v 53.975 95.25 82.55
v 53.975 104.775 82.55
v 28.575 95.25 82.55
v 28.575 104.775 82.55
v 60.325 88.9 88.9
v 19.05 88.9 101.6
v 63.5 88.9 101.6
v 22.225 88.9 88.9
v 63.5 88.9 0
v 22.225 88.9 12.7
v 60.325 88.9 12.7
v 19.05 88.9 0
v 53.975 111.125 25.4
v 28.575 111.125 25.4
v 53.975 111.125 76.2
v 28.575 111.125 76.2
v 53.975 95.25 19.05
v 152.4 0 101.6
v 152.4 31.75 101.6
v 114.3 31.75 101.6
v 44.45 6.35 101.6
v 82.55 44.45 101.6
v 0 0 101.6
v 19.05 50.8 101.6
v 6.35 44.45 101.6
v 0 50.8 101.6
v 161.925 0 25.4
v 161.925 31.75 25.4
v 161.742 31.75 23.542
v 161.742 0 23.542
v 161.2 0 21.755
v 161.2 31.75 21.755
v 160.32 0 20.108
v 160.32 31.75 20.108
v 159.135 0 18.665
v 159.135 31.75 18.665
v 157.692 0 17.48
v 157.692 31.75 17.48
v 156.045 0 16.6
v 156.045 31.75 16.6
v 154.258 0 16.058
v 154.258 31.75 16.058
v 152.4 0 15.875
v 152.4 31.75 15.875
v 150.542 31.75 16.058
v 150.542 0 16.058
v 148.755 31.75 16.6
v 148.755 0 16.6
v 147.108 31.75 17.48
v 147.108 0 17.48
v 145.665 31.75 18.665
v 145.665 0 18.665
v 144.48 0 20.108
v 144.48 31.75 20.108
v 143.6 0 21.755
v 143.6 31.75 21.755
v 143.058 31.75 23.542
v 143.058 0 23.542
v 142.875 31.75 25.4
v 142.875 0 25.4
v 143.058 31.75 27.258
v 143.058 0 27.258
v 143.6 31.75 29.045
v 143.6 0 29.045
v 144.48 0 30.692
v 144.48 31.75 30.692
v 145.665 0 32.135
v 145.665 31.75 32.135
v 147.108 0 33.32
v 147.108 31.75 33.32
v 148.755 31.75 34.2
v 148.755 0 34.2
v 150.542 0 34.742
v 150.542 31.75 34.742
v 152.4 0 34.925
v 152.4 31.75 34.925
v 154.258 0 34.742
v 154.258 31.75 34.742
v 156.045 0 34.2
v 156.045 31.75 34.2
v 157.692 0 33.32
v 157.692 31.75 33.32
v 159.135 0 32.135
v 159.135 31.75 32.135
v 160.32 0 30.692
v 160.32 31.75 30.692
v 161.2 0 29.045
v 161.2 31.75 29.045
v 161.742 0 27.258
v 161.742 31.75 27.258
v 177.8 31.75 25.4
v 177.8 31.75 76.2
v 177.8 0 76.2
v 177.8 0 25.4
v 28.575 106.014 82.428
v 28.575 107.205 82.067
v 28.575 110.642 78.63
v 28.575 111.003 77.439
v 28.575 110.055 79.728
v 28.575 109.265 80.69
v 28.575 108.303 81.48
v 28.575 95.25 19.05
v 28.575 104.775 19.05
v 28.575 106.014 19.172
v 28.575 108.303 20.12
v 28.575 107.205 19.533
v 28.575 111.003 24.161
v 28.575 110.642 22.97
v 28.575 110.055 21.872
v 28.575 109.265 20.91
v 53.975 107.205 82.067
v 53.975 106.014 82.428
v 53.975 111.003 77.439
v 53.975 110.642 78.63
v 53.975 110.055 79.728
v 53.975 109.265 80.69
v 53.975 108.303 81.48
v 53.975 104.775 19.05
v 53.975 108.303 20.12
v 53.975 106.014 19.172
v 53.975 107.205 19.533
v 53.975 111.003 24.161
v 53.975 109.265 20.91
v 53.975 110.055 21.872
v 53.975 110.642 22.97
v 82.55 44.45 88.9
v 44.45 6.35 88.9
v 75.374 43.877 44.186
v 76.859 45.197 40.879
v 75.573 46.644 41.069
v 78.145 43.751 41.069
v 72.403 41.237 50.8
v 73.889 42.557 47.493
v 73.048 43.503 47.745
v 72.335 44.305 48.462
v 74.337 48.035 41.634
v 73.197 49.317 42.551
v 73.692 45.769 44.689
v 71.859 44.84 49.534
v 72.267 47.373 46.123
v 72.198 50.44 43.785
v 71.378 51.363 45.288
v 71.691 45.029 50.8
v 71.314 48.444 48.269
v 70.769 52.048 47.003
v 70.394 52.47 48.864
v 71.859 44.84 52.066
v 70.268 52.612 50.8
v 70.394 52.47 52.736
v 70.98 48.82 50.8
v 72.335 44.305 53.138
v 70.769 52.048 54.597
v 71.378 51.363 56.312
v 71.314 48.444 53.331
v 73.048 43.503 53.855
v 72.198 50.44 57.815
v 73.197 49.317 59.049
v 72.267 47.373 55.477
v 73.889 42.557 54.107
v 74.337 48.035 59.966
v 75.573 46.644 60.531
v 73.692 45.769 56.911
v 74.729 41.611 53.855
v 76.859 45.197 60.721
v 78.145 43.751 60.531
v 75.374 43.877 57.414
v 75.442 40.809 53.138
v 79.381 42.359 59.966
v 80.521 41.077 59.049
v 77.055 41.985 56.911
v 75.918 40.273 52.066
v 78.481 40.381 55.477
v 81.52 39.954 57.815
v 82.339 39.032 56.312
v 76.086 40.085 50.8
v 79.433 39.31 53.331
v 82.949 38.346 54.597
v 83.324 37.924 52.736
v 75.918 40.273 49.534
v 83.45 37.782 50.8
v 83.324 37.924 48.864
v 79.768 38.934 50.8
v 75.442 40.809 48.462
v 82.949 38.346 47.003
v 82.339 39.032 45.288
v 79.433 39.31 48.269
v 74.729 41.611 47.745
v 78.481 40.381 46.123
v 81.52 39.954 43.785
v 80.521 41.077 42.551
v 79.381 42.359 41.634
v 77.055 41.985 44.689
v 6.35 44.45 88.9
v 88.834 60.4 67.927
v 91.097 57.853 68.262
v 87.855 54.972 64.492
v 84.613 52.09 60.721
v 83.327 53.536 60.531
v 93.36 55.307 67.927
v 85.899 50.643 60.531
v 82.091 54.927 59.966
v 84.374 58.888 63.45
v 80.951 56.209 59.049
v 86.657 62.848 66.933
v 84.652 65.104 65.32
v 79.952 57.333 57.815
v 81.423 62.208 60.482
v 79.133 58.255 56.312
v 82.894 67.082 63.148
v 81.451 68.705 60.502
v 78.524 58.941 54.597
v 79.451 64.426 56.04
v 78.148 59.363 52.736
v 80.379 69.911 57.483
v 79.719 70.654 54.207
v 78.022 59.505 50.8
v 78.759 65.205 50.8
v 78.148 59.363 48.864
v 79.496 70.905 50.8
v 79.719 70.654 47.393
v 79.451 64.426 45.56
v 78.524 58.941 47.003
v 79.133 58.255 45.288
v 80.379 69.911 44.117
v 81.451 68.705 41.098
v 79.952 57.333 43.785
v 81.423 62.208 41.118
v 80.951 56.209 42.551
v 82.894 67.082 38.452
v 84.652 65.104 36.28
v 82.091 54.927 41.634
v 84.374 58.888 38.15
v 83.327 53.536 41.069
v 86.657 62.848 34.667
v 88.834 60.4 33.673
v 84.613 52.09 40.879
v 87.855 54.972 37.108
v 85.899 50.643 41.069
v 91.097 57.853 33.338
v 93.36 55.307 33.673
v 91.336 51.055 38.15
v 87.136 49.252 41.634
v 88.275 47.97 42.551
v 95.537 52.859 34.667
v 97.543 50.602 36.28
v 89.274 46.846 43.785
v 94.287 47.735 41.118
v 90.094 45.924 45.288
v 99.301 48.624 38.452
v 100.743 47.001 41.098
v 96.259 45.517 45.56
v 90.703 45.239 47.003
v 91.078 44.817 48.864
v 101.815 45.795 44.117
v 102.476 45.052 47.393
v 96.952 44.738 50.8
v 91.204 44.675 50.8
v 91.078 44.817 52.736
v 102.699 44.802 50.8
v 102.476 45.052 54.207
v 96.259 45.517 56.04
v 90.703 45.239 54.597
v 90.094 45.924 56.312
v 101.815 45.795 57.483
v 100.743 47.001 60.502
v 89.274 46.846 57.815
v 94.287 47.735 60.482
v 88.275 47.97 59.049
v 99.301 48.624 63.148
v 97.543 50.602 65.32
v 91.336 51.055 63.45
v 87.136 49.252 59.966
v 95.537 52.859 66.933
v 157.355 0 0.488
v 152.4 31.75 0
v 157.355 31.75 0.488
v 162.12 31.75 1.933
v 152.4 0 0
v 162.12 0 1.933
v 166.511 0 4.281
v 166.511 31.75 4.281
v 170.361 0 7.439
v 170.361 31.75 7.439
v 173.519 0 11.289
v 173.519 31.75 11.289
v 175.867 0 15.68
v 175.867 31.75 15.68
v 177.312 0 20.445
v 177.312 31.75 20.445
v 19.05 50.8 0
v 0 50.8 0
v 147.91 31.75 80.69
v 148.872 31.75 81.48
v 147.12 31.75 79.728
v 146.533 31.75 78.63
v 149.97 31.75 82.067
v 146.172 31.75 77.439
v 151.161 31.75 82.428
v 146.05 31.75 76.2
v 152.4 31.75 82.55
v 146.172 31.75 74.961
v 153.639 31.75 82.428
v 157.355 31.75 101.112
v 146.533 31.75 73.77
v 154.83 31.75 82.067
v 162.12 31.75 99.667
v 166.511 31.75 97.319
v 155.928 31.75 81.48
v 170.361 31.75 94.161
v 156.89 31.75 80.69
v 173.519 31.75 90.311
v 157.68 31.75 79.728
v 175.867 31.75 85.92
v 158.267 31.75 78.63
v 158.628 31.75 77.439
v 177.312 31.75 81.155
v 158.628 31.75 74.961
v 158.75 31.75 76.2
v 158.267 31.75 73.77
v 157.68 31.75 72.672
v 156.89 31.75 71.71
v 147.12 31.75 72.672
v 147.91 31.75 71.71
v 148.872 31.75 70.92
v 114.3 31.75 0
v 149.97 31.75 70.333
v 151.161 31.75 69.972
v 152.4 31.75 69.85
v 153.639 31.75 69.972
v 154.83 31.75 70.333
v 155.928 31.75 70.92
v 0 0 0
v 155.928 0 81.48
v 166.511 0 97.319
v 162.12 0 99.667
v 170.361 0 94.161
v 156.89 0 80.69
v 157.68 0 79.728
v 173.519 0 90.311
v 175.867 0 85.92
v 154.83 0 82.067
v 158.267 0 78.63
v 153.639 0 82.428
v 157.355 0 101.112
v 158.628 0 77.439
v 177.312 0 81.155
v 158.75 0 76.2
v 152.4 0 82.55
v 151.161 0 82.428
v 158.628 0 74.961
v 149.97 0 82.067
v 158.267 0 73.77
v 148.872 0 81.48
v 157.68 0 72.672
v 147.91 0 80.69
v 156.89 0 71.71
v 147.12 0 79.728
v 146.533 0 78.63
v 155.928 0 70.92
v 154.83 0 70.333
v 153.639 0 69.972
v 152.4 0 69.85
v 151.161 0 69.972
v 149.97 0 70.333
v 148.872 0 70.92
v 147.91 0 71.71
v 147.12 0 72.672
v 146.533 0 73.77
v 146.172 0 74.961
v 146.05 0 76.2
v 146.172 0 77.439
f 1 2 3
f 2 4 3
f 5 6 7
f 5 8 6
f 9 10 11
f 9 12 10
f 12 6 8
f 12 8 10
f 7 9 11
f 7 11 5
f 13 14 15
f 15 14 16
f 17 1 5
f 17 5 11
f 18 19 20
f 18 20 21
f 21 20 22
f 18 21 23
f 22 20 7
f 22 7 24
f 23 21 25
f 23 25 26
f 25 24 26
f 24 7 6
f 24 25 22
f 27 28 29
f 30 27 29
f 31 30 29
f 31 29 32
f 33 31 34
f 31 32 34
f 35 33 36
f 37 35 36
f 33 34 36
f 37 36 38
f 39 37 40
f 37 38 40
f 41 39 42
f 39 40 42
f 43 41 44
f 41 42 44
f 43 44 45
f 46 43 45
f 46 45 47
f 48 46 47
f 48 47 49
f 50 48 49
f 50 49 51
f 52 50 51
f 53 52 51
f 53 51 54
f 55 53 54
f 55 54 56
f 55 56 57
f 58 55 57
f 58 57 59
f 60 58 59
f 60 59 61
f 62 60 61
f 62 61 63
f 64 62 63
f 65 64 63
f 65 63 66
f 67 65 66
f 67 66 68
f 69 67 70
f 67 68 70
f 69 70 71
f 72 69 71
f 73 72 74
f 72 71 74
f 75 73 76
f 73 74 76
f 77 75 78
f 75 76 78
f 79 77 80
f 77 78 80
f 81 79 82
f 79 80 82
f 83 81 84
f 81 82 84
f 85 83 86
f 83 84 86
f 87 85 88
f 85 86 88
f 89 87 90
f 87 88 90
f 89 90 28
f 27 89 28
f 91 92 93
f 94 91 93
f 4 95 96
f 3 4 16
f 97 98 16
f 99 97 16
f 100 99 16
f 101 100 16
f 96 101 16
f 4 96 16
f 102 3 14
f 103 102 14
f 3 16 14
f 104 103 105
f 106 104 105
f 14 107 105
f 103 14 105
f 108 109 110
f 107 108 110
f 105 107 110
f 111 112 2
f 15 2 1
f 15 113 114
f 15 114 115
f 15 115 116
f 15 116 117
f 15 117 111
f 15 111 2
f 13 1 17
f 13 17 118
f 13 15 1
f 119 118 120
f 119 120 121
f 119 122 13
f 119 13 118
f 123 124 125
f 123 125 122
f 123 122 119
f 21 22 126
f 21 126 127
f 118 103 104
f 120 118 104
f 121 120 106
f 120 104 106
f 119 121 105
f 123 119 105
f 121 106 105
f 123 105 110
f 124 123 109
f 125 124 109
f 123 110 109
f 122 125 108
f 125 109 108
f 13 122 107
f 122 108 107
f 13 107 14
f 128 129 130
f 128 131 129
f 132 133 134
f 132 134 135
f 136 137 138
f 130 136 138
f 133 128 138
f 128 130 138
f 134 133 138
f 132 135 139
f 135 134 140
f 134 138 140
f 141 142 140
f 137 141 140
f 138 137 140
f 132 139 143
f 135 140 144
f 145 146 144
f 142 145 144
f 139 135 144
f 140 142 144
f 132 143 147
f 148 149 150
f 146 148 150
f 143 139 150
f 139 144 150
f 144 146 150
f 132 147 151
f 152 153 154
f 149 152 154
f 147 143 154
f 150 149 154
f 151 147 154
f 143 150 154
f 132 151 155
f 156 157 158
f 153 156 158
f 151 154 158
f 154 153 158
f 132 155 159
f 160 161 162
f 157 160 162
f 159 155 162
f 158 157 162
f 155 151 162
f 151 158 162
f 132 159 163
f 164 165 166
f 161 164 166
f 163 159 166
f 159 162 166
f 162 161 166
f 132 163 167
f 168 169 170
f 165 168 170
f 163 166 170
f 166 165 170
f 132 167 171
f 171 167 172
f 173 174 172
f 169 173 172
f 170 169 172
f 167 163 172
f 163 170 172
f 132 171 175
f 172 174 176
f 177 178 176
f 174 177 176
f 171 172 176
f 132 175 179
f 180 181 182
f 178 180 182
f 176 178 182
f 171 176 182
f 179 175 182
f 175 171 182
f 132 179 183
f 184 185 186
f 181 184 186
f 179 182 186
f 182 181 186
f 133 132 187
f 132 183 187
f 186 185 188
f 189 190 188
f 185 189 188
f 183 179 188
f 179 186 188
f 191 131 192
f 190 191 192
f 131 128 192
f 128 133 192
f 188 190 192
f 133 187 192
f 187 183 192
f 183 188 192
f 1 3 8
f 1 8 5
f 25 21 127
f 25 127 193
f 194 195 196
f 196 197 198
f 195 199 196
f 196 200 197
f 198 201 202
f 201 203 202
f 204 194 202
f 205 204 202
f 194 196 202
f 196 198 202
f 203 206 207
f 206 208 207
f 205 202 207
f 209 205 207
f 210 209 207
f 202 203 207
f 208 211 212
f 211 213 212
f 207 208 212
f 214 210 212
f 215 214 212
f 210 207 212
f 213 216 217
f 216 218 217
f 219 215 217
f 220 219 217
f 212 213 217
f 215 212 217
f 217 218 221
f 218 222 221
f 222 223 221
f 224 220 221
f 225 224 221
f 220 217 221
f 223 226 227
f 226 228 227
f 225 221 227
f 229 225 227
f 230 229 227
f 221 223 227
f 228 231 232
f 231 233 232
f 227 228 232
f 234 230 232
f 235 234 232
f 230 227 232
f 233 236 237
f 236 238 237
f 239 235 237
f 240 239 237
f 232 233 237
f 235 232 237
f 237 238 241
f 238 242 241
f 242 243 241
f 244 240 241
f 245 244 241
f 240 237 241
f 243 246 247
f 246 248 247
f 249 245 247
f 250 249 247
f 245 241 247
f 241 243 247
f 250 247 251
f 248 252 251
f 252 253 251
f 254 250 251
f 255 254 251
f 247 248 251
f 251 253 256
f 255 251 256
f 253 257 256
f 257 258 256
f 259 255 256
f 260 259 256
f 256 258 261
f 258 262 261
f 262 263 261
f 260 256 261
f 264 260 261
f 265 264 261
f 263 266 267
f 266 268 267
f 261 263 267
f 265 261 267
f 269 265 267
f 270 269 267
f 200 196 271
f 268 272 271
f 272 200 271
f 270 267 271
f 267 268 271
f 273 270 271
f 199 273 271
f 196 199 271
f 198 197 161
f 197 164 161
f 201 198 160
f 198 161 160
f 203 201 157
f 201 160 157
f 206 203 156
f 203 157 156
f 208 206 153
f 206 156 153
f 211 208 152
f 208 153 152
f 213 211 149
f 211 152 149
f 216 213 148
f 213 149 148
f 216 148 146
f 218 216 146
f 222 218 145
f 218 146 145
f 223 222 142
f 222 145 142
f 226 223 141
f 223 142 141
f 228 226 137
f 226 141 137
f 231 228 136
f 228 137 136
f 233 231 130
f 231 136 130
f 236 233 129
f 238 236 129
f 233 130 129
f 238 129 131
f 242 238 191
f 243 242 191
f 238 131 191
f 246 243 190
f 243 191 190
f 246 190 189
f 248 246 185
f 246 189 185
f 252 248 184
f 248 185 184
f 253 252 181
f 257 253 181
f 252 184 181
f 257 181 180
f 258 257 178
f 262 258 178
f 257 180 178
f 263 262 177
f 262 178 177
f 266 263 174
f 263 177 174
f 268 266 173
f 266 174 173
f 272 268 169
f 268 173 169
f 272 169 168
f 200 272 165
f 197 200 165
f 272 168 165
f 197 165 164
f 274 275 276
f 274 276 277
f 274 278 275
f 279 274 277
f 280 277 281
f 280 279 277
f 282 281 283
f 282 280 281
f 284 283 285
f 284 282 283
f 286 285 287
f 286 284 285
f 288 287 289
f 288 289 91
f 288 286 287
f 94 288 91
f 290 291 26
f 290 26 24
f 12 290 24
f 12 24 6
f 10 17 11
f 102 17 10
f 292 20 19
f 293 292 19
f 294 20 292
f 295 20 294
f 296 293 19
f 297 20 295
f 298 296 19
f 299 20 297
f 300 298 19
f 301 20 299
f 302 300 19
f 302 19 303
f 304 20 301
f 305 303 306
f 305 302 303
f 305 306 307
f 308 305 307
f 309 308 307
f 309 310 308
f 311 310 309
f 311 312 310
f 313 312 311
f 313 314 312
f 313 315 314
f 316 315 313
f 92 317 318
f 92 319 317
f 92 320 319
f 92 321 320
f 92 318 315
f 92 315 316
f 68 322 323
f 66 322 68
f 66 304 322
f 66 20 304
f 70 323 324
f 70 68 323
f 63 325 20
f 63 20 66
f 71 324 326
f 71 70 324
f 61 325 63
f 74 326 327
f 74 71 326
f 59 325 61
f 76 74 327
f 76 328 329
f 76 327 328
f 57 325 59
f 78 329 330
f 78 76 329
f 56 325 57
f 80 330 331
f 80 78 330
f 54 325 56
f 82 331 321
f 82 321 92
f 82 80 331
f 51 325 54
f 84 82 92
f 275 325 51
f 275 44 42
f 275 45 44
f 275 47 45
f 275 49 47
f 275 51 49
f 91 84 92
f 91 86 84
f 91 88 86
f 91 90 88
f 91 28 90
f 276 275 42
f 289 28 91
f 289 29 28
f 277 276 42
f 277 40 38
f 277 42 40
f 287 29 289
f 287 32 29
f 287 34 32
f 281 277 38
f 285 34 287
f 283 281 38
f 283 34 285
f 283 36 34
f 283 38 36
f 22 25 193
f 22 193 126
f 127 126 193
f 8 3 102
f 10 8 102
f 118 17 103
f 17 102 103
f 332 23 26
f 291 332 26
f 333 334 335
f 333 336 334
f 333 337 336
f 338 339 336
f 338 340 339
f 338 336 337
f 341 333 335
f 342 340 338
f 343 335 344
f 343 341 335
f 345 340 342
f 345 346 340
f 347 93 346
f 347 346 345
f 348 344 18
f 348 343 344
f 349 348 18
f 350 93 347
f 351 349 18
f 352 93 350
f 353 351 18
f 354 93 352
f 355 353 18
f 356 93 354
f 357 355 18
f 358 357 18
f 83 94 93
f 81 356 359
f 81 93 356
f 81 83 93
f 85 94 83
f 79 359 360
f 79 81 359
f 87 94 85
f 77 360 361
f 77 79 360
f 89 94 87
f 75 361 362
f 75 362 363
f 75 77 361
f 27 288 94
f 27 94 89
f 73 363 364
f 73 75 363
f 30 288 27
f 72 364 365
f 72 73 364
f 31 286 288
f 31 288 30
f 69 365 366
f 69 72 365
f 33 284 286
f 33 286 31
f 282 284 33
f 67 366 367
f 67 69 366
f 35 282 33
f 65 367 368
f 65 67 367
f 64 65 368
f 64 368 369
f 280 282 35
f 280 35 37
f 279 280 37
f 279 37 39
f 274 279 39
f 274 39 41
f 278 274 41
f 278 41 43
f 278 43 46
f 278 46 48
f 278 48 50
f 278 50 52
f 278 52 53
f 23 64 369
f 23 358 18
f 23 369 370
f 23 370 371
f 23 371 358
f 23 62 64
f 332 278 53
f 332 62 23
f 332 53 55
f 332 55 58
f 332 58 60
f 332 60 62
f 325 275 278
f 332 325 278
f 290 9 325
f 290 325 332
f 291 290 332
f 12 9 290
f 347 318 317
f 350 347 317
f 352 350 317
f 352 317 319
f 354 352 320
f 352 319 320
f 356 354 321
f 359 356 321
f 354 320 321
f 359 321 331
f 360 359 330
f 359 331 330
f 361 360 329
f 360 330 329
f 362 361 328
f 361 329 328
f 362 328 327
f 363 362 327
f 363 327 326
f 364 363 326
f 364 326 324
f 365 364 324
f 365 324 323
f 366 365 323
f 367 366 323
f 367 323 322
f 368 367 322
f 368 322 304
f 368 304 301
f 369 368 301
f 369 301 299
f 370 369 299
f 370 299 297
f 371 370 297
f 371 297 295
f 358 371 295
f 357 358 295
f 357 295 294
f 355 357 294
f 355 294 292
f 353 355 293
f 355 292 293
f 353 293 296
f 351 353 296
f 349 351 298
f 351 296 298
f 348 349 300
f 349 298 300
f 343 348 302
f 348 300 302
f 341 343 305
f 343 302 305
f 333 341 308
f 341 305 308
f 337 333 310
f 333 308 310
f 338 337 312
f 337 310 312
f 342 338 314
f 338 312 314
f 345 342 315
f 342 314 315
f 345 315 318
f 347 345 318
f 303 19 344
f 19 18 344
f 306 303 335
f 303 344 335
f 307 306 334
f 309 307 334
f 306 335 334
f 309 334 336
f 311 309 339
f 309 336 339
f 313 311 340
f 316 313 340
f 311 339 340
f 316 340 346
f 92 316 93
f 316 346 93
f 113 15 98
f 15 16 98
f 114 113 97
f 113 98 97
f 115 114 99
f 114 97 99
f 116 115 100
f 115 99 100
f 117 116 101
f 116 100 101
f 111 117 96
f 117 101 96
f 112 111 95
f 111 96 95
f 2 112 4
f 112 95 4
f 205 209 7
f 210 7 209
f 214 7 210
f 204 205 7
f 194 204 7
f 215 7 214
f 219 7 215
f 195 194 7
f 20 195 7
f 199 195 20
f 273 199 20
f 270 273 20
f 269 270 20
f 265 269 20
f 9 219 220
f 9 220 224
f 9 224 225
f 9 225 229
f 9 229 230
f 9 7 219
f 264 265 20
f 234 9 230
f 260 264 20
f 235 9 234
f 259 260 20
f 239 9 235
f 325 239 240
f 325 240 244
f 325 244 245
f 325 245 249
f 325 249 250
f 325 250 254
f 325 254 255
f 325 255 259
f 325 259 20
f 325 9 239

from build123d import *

# Parameters (mm, degrees)
BOSS_EXTRUDE1_DEPTH                              = 101.6
BOSS_EXTRUDE2_DEPTH                              = 12.7
CHAMFER1_SIZE                                    = 6.35
FILLET1_R                                        = 25.4
CUT_EXTRUDE2_DEPTH                               = 12.7
CSK_FOR_3_4_FLAT_HEAD_MACHINE_SCREW1_D           = 19.84248
CSK_FOR_3_4_FLAT_HEAD_MACHINE_SCREW1_DEPTH       = 19.05
CSK_FOR_3_4_FLAT_HEAD_MACHINE_SCREW1_CSINK_D     = 34.925
CSK_FOR_3_4_FLAT_HEAD_MACHINE_SCREW1_CSINK_ANGLE = 82
CSK_FOR_3_4_FLAT_HEAD_MACHINE_SCREW1_TIP         = 5.961282408
F_3_4_0_75_DIAMETER_HOLE1_D                      = 19.05
F_1_2_0_5_DIAMETER_HOLE1_D                       = 12.7


with BuildPart() as part:
    # Sketch1 → Boss-Extrude1 (new body)
    with BuildSketch(Plane.XY):
        Polygon((0, 0), (0, 50.8), (19.05, 50.8), (19.05, 88.9), (63.5, 88.9), (114.3, 31.75), (177.8, 31.75), (177.8, 0), align=None)
    extrude(amount=BOSS_EXTRUDE1_DEPTH)

    # Sketch2 → Boss-Extrude2 (add, symmetric)
    with BuildSketch(Plane.ZY.offset(-41.275)):
        with BuildLine():
            Line((25.4, 111.125), (76.2, 111.125))
            ThreePointArc((76.2, 111.125), (80.690128061, 109.265128061), (82.55, 104.775))
            Line((82.55, 104.775), (82.55, 88.9))
            Line((82.55, 88.9), (19.05, 88.9))
            Line((19.05, 88.9), (19.05, 104.775))
            ThreePointArc((19.05, 104.775), (20.909871939, 109.265128061), (25.4, 111.125))
        make_face()
    extrude(amount=BOSS_EXTRUDE2_DEPTH, both=True)

    # Chamfer1
    chamfer1_edges = [part.edges().sort_by_distance(p)[0] for p in [
        (53.975, 88.9, 50.8),
        (41.275, 88.9, 19.05),
        (41.275, 88.9, 82.55),
        (28.575, 88.9, 50.8),
    ]]
    chamfer(chamfer1_edges, length=CHAMFER1_SIZE)

    # Fillet1
    fillet1_edges = [part.edges().sort_by_distance(p)[0] for p in [
        (177.8, 15.875, 0),
        (177.8, 15.875, 101.6),
    ]]
    fillet(fillet1_edges, radius=FILLET1_R)

    # Sketch5 → Cut-Extrude2 (cut)
    with BuildSketch(Plane.XY.offset(101.6)):
        Polygon((6.35, 44.45), (82.55, 44.45), (44.45, 6.35), align=None)
    extrude(amount=-CUT_EXTRUDE2_DEPTH, mode=Mode.SUBTRACT)

    # CSK for 3/4 Flat Head Machine Screw1
    with Locations(Plane(origin=(79.615862069, 70.769655172, 0), x_dir=(0, 0, -1), z_dir=(0.7474093186836597, 0.6643638388299198, 0))):
        with Locations((-50.8, -17.28154091)):
            CounterSinkHole(CSK_FOR_3_4_FLAT_HEAD_MACHINE_SCREW1_D / 2, CSK_FOR_3_4_FLAT_HEAD_MACHINE_SCREW1_CSINK_D / 2, depth=CSK_FOR_3_4_FLAT_HEAD_MACHINE_SCREW1_DEPTH, counter_sink_angle=CSK_FOR_3_4_FLAT_HEAD_MACHINE_SCREW1_CSINK_ANGLE)
            with Locations((0, 0, -(CSK_FOR_3_4_FLAT_HEAD_MACHINE_SCREW1_DEPTH + CSK_FOR_3_4_FLAT_HEAD_MACHINE_SCREW1_TIP / 2))):  # 118° drill point
                Cone(0, CSK_FOR_3_4_FLAT_HEAD_MACHINE_SCREW1_D / 2, CSK_FOR_3_4_FLAT_HEAD_MACHINE_SCREW1_TIP, mode=Mode.SUBTRACT)

    # 3/4 (0.75) Diameter Hole1 (through all)
    with Locations(Plane(origin=(0, 0, 0), x_dir=(-1, 0, 0), z_dir=(0, -1, 0))):
        with Locations((-152.4, -25.4)):
            Hole(F_3_4_0_75_DIAMETER_HOLE1_D / 2)

    # 1/2 (0.5) Diameter Hole1 (through all)
    with Locations(Plane(origin=(0, 0, 0), x_dir=(-1, 0, 0), z_dir=(0, -1, 0))):
        with Locations((-152.4, -76.2)):
            Hole(F_1_2_0_5_DIAMETER_HOLE1_D / 2)


solid = part.part
